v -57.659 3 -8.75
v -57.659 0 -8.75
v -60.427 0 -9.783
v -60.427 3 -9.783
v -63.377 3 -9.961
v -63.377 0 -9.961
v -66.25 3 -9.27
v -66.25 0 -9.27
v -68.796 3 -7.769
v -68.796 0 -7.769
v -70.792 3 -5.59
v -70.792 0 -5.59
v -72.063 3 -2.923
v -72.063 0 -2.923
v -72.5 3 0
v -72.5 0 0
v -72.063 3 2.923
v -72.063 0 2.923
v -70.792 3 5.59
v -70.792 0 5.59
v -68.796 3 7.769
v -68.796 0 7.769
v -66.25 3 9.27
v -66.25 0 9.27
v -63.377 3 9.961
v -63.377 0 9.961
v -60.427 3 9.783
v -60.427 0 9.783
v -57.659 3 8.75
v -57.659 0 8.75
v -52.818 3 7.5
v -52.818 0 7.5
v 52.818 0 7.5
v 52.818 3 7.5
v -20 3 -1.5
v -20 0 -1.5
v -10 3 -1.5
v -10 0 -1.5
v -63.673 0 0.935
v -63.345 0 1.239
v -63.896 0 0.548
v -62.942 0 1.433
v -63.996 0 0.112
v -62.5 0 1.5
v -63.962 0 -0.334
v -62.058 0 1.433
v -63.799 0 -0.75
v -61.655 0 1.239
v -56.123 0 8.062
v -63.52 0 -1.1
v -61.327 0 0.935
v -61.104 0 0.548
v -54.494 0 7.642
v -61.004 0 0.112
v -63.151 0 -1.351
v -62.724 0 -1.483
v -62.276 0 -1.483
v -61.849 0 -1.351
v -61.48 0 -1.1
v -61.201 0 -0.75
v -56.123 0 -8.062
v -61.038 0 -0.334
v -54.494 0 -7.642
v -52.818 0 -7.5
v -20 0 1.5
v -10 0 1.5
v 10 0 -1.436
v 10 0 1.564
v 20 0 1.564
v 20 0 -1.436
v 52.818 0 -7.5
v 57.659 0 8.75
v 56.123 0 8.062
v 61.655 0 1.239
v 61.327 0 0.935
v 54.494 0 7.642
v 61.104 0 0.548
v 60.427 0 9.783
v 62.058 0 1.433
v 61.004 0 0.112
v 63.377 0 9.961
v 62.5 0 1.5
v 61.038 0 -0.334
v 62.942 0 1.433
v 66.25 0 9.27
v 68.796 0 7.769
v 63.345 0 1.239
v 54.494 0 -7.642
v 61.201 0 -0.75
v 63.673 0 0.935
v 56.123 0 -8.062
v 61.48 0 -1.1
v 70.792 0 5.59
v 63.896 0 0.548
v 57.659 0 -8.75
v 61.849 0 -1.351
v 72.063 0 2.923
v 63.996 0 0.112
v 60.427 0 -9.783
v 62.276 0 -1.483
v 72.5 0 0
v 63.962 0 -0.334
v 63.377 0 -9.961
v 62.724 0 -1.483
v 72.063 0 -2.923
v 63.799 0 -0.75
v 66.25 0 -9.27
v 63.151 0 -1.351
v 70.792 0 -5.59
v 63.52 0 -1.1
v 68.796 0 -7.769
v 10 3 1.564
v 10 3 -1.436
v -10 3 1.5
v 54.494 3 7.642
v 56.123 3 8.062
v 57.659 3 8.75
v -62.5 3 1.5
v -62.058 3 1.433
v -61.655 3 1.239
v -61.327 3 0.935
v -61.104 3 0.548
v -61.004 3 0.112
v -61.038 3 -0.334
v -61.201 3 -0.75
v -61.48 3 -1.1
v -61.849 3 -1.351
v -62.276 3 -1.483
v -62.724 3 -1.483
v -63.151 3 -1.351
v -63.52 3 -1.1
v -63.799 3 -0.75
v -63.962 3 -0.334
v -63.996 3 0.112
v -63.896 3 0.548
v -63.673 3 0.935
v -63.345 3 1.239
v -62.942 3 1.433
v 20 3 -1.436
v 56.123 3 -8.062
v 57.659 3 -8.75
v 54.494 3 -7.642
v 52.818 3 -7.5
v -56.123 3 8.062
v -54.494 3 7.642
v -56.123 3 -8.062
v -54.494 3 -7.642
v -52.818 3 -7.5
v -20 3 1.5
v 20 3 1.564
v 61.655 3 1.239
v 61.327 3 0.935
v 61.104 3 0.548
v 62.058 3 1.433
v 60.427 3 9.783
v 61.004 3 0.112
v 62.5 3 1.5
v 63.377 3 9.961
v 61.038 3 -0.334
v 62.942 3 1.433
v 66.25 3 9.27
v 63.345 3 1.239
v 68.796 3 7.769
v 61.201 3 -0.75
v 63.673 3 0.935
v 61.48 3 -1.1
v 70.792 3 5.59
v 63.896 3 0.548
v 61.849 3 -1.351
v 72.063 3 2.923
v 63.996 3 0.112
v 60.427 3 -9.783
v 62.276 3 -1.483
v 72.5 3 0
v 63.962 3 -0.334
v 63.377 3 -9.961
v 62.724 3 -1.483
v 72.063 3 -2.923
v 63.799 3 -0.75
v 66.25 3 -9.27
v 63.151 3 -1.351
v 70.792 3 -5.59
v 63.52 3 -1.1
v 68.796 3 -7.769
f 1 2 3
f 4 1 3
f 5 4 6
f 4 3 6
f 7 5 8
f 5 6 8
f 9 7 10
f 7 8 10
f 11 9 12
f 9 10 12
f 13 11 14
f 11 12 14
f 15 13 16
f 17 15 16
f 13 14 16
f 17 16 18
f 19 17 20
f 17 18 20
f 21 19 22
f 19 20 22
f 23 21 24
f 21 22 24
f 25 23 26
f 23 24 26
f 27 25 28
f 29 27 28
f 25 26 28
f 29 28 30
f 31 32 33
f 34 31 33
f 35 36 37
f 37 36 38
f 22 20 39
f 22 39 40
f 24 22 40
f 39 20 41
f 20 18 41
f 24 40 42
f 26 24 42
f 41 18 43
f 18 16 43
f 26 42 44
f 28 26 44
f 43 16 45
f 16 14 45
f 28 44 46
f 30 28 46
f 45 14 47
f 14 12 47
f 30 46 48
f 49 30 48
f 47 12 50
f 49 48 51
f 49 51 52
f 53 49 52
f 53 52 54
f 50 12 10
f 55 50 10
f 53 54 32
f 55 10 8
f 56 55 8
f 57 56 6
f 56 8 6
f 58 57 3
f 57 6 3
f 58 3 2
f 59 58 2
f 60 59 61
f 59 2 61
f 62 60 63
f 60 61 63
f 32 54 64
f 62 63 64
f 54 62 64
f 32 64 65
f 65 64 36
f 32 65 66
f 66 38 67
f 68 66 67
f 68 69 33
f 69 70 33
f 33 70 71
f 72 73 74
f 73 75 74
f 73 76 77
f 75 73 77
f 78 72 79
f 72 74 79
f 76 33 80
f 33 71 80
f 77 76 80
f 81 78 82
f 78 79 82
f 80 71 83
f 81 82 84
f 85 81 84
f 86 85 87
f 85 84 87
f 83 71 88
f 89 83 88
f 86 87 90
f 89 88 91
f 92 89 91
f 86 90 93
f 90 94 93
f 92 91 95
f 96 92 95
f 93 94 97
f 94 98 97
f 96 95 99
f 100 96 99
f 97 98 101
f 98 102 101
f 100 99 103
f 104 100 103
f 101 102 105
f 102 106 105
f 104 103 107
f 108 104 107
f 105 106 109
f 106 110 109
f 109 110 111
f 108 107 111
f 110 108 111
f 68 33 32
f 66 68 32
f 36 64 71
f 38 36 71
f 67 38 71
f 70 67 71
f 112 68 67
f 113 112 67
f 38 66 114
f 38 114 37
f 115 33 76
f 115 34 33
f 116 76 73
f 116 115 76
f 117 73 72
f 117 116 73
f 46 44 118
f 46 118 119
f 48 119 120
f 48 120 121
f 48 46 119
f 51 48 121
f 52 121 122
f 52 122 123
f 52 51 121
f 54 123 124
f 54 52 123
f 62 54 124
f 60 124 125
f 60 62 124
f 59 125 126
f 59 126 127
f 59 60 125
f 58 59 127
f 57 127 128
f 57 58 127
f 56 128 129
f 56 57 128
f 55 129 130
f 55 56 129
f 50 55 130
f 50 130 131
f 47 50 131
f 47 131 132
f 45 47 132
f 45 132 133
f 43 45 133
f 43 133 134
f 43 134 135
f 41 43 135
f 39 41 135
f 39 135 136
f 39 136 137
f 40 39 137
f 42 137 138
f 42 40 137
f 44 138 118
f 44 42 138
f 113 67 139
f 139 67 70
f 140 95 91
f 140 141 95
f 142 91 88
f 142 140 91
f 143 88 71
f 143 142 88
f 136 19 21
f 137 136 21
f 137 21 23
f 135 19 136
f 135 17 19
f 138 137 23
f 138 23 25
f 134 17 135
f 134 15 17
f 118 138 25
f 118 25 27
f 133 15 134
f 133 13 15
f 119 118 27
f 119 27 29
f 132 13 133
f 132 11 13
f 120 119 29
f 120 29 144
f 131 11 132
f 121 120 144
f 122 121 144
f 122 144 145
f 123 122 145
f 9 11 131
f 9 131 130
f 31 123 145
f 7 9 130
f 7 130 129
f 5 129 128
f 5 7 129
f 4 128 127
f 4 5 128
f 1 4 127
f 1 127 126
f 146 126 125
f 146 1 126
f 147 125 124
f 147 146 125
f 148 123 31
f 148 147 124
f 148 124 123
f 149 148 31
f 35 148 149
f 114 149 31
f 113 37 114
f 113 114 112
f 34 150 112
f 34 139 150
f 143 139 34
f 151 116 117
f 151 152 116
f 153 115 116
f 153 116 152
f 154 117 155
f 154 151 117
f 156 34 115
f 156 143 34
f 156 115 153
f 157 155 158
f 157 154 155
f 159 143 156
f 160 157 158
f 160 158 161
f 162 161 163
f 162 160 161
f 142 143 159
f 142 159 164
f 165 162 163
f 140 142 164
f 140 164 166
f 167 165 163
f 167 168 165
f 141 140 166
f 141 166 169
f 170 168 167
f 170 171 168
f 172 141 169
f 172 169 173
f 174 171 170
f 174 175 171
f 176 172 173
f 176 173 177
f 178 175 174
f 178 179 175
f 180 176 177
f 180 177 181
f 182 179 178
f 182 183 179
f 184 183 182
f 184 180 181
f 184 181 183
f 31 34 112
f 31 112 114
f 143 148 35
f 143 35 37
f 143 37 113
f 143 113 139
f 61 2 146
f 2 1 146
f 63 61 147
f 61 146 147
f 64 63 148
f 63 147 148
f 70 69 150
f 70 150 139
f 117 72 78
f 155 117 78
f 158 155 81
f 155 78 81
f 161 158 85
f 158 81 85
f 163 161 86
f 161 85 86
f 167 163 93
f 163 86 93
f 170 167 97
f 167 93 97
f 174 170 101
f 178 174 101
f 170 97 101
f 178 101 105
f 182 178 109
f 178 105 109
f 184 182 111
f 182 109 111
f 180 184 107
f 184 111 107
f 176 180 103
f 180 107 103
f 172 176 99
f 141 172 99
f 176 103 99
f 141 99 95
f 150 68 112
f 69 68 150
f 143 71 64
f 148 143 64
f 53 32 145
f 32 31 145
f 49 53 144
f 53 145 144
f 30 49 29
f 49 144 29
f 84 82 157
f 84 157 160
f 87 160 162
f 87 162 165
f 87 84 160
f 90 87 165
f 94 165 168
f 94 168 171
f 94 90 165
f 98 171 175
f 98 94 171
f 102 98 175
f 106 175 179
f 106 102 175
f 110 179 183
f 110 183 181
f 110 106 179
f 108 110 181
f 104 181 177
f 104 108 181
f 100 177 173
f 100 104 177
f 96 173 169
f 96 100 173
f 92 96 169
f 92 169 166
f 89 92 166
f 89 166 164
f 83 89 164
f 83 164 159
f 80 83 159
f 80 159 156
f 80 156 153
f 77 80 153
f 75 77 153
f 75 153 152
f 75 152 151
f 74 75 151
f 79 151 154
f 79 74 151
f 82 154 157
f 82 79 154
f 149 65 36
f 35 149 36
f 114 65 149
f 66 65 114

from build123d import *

# Parameters (mm, degrees)
SKETCH_1_R      = 1.5
SKETCH_1_W      = 10
SKETCH_1_H      = 3
EXTRUDE_1_DEPTH = 3
FILLET_1_R      = 10


with BuildPart() as part:
    # 草图1 → 凸台-拉伸1 (new body)
    with BuildSketch(Plane(origin=(0, 0, 0), x_dir=(1, 0, 0), z_dir=(0, 1, 0))):
        with BuildLine():
            Line((-55.885621722, -7.5), (55.885621722, -7.5))
            ThreePointArc((55.885621722, -7.5), (72.5, 0), (55.885621722, 7.5))
            Line((55.885621722, 7.5), (-55.885621722, 7.5))
            ThreePointArc((-55.885621722, 7.5), (-72.5, 0), (-55.885621722, -7.5))
        make_face()
        with Locations(Location((-62.5, 0, 0), (0, 0, 270))):
            Circle(SKETCH_1_R, mode=Mode.SUBTRACT)
        with Locations(Location((62.5, 0, 0), (0, 0, 270))):
            Circle(SKETCH_1_R, mode=Mode.SUBTRACT)
        with Locations((-15, 0)):
            Rectangle(SKETCH_1_W, SKETCH_1_H, mode=Mode.SUBTRACT)
        with Locations((15, -0.064058726)):
            Rectangle(SKETCH_1_W, SKETCH_1_H, mode=Mode.SUBTRACT)
    extrude(amount=EXTRUDE_1_DEPTH)

    # 圆角1
    fillet_1_edges = [part.edges().sort_by_distance(p)[0] for p in [
        (-55.885621722, 1.5, -7.5),
        (55.885621722, 1.5, -7.5),
        (55.885621722, 1.5, 7.5),
        (-55.885621722, 1.5, 7.5),
    ]]
    fillet(fillet_1_edges, radius=FILLET_1_R)


solid = part.part
